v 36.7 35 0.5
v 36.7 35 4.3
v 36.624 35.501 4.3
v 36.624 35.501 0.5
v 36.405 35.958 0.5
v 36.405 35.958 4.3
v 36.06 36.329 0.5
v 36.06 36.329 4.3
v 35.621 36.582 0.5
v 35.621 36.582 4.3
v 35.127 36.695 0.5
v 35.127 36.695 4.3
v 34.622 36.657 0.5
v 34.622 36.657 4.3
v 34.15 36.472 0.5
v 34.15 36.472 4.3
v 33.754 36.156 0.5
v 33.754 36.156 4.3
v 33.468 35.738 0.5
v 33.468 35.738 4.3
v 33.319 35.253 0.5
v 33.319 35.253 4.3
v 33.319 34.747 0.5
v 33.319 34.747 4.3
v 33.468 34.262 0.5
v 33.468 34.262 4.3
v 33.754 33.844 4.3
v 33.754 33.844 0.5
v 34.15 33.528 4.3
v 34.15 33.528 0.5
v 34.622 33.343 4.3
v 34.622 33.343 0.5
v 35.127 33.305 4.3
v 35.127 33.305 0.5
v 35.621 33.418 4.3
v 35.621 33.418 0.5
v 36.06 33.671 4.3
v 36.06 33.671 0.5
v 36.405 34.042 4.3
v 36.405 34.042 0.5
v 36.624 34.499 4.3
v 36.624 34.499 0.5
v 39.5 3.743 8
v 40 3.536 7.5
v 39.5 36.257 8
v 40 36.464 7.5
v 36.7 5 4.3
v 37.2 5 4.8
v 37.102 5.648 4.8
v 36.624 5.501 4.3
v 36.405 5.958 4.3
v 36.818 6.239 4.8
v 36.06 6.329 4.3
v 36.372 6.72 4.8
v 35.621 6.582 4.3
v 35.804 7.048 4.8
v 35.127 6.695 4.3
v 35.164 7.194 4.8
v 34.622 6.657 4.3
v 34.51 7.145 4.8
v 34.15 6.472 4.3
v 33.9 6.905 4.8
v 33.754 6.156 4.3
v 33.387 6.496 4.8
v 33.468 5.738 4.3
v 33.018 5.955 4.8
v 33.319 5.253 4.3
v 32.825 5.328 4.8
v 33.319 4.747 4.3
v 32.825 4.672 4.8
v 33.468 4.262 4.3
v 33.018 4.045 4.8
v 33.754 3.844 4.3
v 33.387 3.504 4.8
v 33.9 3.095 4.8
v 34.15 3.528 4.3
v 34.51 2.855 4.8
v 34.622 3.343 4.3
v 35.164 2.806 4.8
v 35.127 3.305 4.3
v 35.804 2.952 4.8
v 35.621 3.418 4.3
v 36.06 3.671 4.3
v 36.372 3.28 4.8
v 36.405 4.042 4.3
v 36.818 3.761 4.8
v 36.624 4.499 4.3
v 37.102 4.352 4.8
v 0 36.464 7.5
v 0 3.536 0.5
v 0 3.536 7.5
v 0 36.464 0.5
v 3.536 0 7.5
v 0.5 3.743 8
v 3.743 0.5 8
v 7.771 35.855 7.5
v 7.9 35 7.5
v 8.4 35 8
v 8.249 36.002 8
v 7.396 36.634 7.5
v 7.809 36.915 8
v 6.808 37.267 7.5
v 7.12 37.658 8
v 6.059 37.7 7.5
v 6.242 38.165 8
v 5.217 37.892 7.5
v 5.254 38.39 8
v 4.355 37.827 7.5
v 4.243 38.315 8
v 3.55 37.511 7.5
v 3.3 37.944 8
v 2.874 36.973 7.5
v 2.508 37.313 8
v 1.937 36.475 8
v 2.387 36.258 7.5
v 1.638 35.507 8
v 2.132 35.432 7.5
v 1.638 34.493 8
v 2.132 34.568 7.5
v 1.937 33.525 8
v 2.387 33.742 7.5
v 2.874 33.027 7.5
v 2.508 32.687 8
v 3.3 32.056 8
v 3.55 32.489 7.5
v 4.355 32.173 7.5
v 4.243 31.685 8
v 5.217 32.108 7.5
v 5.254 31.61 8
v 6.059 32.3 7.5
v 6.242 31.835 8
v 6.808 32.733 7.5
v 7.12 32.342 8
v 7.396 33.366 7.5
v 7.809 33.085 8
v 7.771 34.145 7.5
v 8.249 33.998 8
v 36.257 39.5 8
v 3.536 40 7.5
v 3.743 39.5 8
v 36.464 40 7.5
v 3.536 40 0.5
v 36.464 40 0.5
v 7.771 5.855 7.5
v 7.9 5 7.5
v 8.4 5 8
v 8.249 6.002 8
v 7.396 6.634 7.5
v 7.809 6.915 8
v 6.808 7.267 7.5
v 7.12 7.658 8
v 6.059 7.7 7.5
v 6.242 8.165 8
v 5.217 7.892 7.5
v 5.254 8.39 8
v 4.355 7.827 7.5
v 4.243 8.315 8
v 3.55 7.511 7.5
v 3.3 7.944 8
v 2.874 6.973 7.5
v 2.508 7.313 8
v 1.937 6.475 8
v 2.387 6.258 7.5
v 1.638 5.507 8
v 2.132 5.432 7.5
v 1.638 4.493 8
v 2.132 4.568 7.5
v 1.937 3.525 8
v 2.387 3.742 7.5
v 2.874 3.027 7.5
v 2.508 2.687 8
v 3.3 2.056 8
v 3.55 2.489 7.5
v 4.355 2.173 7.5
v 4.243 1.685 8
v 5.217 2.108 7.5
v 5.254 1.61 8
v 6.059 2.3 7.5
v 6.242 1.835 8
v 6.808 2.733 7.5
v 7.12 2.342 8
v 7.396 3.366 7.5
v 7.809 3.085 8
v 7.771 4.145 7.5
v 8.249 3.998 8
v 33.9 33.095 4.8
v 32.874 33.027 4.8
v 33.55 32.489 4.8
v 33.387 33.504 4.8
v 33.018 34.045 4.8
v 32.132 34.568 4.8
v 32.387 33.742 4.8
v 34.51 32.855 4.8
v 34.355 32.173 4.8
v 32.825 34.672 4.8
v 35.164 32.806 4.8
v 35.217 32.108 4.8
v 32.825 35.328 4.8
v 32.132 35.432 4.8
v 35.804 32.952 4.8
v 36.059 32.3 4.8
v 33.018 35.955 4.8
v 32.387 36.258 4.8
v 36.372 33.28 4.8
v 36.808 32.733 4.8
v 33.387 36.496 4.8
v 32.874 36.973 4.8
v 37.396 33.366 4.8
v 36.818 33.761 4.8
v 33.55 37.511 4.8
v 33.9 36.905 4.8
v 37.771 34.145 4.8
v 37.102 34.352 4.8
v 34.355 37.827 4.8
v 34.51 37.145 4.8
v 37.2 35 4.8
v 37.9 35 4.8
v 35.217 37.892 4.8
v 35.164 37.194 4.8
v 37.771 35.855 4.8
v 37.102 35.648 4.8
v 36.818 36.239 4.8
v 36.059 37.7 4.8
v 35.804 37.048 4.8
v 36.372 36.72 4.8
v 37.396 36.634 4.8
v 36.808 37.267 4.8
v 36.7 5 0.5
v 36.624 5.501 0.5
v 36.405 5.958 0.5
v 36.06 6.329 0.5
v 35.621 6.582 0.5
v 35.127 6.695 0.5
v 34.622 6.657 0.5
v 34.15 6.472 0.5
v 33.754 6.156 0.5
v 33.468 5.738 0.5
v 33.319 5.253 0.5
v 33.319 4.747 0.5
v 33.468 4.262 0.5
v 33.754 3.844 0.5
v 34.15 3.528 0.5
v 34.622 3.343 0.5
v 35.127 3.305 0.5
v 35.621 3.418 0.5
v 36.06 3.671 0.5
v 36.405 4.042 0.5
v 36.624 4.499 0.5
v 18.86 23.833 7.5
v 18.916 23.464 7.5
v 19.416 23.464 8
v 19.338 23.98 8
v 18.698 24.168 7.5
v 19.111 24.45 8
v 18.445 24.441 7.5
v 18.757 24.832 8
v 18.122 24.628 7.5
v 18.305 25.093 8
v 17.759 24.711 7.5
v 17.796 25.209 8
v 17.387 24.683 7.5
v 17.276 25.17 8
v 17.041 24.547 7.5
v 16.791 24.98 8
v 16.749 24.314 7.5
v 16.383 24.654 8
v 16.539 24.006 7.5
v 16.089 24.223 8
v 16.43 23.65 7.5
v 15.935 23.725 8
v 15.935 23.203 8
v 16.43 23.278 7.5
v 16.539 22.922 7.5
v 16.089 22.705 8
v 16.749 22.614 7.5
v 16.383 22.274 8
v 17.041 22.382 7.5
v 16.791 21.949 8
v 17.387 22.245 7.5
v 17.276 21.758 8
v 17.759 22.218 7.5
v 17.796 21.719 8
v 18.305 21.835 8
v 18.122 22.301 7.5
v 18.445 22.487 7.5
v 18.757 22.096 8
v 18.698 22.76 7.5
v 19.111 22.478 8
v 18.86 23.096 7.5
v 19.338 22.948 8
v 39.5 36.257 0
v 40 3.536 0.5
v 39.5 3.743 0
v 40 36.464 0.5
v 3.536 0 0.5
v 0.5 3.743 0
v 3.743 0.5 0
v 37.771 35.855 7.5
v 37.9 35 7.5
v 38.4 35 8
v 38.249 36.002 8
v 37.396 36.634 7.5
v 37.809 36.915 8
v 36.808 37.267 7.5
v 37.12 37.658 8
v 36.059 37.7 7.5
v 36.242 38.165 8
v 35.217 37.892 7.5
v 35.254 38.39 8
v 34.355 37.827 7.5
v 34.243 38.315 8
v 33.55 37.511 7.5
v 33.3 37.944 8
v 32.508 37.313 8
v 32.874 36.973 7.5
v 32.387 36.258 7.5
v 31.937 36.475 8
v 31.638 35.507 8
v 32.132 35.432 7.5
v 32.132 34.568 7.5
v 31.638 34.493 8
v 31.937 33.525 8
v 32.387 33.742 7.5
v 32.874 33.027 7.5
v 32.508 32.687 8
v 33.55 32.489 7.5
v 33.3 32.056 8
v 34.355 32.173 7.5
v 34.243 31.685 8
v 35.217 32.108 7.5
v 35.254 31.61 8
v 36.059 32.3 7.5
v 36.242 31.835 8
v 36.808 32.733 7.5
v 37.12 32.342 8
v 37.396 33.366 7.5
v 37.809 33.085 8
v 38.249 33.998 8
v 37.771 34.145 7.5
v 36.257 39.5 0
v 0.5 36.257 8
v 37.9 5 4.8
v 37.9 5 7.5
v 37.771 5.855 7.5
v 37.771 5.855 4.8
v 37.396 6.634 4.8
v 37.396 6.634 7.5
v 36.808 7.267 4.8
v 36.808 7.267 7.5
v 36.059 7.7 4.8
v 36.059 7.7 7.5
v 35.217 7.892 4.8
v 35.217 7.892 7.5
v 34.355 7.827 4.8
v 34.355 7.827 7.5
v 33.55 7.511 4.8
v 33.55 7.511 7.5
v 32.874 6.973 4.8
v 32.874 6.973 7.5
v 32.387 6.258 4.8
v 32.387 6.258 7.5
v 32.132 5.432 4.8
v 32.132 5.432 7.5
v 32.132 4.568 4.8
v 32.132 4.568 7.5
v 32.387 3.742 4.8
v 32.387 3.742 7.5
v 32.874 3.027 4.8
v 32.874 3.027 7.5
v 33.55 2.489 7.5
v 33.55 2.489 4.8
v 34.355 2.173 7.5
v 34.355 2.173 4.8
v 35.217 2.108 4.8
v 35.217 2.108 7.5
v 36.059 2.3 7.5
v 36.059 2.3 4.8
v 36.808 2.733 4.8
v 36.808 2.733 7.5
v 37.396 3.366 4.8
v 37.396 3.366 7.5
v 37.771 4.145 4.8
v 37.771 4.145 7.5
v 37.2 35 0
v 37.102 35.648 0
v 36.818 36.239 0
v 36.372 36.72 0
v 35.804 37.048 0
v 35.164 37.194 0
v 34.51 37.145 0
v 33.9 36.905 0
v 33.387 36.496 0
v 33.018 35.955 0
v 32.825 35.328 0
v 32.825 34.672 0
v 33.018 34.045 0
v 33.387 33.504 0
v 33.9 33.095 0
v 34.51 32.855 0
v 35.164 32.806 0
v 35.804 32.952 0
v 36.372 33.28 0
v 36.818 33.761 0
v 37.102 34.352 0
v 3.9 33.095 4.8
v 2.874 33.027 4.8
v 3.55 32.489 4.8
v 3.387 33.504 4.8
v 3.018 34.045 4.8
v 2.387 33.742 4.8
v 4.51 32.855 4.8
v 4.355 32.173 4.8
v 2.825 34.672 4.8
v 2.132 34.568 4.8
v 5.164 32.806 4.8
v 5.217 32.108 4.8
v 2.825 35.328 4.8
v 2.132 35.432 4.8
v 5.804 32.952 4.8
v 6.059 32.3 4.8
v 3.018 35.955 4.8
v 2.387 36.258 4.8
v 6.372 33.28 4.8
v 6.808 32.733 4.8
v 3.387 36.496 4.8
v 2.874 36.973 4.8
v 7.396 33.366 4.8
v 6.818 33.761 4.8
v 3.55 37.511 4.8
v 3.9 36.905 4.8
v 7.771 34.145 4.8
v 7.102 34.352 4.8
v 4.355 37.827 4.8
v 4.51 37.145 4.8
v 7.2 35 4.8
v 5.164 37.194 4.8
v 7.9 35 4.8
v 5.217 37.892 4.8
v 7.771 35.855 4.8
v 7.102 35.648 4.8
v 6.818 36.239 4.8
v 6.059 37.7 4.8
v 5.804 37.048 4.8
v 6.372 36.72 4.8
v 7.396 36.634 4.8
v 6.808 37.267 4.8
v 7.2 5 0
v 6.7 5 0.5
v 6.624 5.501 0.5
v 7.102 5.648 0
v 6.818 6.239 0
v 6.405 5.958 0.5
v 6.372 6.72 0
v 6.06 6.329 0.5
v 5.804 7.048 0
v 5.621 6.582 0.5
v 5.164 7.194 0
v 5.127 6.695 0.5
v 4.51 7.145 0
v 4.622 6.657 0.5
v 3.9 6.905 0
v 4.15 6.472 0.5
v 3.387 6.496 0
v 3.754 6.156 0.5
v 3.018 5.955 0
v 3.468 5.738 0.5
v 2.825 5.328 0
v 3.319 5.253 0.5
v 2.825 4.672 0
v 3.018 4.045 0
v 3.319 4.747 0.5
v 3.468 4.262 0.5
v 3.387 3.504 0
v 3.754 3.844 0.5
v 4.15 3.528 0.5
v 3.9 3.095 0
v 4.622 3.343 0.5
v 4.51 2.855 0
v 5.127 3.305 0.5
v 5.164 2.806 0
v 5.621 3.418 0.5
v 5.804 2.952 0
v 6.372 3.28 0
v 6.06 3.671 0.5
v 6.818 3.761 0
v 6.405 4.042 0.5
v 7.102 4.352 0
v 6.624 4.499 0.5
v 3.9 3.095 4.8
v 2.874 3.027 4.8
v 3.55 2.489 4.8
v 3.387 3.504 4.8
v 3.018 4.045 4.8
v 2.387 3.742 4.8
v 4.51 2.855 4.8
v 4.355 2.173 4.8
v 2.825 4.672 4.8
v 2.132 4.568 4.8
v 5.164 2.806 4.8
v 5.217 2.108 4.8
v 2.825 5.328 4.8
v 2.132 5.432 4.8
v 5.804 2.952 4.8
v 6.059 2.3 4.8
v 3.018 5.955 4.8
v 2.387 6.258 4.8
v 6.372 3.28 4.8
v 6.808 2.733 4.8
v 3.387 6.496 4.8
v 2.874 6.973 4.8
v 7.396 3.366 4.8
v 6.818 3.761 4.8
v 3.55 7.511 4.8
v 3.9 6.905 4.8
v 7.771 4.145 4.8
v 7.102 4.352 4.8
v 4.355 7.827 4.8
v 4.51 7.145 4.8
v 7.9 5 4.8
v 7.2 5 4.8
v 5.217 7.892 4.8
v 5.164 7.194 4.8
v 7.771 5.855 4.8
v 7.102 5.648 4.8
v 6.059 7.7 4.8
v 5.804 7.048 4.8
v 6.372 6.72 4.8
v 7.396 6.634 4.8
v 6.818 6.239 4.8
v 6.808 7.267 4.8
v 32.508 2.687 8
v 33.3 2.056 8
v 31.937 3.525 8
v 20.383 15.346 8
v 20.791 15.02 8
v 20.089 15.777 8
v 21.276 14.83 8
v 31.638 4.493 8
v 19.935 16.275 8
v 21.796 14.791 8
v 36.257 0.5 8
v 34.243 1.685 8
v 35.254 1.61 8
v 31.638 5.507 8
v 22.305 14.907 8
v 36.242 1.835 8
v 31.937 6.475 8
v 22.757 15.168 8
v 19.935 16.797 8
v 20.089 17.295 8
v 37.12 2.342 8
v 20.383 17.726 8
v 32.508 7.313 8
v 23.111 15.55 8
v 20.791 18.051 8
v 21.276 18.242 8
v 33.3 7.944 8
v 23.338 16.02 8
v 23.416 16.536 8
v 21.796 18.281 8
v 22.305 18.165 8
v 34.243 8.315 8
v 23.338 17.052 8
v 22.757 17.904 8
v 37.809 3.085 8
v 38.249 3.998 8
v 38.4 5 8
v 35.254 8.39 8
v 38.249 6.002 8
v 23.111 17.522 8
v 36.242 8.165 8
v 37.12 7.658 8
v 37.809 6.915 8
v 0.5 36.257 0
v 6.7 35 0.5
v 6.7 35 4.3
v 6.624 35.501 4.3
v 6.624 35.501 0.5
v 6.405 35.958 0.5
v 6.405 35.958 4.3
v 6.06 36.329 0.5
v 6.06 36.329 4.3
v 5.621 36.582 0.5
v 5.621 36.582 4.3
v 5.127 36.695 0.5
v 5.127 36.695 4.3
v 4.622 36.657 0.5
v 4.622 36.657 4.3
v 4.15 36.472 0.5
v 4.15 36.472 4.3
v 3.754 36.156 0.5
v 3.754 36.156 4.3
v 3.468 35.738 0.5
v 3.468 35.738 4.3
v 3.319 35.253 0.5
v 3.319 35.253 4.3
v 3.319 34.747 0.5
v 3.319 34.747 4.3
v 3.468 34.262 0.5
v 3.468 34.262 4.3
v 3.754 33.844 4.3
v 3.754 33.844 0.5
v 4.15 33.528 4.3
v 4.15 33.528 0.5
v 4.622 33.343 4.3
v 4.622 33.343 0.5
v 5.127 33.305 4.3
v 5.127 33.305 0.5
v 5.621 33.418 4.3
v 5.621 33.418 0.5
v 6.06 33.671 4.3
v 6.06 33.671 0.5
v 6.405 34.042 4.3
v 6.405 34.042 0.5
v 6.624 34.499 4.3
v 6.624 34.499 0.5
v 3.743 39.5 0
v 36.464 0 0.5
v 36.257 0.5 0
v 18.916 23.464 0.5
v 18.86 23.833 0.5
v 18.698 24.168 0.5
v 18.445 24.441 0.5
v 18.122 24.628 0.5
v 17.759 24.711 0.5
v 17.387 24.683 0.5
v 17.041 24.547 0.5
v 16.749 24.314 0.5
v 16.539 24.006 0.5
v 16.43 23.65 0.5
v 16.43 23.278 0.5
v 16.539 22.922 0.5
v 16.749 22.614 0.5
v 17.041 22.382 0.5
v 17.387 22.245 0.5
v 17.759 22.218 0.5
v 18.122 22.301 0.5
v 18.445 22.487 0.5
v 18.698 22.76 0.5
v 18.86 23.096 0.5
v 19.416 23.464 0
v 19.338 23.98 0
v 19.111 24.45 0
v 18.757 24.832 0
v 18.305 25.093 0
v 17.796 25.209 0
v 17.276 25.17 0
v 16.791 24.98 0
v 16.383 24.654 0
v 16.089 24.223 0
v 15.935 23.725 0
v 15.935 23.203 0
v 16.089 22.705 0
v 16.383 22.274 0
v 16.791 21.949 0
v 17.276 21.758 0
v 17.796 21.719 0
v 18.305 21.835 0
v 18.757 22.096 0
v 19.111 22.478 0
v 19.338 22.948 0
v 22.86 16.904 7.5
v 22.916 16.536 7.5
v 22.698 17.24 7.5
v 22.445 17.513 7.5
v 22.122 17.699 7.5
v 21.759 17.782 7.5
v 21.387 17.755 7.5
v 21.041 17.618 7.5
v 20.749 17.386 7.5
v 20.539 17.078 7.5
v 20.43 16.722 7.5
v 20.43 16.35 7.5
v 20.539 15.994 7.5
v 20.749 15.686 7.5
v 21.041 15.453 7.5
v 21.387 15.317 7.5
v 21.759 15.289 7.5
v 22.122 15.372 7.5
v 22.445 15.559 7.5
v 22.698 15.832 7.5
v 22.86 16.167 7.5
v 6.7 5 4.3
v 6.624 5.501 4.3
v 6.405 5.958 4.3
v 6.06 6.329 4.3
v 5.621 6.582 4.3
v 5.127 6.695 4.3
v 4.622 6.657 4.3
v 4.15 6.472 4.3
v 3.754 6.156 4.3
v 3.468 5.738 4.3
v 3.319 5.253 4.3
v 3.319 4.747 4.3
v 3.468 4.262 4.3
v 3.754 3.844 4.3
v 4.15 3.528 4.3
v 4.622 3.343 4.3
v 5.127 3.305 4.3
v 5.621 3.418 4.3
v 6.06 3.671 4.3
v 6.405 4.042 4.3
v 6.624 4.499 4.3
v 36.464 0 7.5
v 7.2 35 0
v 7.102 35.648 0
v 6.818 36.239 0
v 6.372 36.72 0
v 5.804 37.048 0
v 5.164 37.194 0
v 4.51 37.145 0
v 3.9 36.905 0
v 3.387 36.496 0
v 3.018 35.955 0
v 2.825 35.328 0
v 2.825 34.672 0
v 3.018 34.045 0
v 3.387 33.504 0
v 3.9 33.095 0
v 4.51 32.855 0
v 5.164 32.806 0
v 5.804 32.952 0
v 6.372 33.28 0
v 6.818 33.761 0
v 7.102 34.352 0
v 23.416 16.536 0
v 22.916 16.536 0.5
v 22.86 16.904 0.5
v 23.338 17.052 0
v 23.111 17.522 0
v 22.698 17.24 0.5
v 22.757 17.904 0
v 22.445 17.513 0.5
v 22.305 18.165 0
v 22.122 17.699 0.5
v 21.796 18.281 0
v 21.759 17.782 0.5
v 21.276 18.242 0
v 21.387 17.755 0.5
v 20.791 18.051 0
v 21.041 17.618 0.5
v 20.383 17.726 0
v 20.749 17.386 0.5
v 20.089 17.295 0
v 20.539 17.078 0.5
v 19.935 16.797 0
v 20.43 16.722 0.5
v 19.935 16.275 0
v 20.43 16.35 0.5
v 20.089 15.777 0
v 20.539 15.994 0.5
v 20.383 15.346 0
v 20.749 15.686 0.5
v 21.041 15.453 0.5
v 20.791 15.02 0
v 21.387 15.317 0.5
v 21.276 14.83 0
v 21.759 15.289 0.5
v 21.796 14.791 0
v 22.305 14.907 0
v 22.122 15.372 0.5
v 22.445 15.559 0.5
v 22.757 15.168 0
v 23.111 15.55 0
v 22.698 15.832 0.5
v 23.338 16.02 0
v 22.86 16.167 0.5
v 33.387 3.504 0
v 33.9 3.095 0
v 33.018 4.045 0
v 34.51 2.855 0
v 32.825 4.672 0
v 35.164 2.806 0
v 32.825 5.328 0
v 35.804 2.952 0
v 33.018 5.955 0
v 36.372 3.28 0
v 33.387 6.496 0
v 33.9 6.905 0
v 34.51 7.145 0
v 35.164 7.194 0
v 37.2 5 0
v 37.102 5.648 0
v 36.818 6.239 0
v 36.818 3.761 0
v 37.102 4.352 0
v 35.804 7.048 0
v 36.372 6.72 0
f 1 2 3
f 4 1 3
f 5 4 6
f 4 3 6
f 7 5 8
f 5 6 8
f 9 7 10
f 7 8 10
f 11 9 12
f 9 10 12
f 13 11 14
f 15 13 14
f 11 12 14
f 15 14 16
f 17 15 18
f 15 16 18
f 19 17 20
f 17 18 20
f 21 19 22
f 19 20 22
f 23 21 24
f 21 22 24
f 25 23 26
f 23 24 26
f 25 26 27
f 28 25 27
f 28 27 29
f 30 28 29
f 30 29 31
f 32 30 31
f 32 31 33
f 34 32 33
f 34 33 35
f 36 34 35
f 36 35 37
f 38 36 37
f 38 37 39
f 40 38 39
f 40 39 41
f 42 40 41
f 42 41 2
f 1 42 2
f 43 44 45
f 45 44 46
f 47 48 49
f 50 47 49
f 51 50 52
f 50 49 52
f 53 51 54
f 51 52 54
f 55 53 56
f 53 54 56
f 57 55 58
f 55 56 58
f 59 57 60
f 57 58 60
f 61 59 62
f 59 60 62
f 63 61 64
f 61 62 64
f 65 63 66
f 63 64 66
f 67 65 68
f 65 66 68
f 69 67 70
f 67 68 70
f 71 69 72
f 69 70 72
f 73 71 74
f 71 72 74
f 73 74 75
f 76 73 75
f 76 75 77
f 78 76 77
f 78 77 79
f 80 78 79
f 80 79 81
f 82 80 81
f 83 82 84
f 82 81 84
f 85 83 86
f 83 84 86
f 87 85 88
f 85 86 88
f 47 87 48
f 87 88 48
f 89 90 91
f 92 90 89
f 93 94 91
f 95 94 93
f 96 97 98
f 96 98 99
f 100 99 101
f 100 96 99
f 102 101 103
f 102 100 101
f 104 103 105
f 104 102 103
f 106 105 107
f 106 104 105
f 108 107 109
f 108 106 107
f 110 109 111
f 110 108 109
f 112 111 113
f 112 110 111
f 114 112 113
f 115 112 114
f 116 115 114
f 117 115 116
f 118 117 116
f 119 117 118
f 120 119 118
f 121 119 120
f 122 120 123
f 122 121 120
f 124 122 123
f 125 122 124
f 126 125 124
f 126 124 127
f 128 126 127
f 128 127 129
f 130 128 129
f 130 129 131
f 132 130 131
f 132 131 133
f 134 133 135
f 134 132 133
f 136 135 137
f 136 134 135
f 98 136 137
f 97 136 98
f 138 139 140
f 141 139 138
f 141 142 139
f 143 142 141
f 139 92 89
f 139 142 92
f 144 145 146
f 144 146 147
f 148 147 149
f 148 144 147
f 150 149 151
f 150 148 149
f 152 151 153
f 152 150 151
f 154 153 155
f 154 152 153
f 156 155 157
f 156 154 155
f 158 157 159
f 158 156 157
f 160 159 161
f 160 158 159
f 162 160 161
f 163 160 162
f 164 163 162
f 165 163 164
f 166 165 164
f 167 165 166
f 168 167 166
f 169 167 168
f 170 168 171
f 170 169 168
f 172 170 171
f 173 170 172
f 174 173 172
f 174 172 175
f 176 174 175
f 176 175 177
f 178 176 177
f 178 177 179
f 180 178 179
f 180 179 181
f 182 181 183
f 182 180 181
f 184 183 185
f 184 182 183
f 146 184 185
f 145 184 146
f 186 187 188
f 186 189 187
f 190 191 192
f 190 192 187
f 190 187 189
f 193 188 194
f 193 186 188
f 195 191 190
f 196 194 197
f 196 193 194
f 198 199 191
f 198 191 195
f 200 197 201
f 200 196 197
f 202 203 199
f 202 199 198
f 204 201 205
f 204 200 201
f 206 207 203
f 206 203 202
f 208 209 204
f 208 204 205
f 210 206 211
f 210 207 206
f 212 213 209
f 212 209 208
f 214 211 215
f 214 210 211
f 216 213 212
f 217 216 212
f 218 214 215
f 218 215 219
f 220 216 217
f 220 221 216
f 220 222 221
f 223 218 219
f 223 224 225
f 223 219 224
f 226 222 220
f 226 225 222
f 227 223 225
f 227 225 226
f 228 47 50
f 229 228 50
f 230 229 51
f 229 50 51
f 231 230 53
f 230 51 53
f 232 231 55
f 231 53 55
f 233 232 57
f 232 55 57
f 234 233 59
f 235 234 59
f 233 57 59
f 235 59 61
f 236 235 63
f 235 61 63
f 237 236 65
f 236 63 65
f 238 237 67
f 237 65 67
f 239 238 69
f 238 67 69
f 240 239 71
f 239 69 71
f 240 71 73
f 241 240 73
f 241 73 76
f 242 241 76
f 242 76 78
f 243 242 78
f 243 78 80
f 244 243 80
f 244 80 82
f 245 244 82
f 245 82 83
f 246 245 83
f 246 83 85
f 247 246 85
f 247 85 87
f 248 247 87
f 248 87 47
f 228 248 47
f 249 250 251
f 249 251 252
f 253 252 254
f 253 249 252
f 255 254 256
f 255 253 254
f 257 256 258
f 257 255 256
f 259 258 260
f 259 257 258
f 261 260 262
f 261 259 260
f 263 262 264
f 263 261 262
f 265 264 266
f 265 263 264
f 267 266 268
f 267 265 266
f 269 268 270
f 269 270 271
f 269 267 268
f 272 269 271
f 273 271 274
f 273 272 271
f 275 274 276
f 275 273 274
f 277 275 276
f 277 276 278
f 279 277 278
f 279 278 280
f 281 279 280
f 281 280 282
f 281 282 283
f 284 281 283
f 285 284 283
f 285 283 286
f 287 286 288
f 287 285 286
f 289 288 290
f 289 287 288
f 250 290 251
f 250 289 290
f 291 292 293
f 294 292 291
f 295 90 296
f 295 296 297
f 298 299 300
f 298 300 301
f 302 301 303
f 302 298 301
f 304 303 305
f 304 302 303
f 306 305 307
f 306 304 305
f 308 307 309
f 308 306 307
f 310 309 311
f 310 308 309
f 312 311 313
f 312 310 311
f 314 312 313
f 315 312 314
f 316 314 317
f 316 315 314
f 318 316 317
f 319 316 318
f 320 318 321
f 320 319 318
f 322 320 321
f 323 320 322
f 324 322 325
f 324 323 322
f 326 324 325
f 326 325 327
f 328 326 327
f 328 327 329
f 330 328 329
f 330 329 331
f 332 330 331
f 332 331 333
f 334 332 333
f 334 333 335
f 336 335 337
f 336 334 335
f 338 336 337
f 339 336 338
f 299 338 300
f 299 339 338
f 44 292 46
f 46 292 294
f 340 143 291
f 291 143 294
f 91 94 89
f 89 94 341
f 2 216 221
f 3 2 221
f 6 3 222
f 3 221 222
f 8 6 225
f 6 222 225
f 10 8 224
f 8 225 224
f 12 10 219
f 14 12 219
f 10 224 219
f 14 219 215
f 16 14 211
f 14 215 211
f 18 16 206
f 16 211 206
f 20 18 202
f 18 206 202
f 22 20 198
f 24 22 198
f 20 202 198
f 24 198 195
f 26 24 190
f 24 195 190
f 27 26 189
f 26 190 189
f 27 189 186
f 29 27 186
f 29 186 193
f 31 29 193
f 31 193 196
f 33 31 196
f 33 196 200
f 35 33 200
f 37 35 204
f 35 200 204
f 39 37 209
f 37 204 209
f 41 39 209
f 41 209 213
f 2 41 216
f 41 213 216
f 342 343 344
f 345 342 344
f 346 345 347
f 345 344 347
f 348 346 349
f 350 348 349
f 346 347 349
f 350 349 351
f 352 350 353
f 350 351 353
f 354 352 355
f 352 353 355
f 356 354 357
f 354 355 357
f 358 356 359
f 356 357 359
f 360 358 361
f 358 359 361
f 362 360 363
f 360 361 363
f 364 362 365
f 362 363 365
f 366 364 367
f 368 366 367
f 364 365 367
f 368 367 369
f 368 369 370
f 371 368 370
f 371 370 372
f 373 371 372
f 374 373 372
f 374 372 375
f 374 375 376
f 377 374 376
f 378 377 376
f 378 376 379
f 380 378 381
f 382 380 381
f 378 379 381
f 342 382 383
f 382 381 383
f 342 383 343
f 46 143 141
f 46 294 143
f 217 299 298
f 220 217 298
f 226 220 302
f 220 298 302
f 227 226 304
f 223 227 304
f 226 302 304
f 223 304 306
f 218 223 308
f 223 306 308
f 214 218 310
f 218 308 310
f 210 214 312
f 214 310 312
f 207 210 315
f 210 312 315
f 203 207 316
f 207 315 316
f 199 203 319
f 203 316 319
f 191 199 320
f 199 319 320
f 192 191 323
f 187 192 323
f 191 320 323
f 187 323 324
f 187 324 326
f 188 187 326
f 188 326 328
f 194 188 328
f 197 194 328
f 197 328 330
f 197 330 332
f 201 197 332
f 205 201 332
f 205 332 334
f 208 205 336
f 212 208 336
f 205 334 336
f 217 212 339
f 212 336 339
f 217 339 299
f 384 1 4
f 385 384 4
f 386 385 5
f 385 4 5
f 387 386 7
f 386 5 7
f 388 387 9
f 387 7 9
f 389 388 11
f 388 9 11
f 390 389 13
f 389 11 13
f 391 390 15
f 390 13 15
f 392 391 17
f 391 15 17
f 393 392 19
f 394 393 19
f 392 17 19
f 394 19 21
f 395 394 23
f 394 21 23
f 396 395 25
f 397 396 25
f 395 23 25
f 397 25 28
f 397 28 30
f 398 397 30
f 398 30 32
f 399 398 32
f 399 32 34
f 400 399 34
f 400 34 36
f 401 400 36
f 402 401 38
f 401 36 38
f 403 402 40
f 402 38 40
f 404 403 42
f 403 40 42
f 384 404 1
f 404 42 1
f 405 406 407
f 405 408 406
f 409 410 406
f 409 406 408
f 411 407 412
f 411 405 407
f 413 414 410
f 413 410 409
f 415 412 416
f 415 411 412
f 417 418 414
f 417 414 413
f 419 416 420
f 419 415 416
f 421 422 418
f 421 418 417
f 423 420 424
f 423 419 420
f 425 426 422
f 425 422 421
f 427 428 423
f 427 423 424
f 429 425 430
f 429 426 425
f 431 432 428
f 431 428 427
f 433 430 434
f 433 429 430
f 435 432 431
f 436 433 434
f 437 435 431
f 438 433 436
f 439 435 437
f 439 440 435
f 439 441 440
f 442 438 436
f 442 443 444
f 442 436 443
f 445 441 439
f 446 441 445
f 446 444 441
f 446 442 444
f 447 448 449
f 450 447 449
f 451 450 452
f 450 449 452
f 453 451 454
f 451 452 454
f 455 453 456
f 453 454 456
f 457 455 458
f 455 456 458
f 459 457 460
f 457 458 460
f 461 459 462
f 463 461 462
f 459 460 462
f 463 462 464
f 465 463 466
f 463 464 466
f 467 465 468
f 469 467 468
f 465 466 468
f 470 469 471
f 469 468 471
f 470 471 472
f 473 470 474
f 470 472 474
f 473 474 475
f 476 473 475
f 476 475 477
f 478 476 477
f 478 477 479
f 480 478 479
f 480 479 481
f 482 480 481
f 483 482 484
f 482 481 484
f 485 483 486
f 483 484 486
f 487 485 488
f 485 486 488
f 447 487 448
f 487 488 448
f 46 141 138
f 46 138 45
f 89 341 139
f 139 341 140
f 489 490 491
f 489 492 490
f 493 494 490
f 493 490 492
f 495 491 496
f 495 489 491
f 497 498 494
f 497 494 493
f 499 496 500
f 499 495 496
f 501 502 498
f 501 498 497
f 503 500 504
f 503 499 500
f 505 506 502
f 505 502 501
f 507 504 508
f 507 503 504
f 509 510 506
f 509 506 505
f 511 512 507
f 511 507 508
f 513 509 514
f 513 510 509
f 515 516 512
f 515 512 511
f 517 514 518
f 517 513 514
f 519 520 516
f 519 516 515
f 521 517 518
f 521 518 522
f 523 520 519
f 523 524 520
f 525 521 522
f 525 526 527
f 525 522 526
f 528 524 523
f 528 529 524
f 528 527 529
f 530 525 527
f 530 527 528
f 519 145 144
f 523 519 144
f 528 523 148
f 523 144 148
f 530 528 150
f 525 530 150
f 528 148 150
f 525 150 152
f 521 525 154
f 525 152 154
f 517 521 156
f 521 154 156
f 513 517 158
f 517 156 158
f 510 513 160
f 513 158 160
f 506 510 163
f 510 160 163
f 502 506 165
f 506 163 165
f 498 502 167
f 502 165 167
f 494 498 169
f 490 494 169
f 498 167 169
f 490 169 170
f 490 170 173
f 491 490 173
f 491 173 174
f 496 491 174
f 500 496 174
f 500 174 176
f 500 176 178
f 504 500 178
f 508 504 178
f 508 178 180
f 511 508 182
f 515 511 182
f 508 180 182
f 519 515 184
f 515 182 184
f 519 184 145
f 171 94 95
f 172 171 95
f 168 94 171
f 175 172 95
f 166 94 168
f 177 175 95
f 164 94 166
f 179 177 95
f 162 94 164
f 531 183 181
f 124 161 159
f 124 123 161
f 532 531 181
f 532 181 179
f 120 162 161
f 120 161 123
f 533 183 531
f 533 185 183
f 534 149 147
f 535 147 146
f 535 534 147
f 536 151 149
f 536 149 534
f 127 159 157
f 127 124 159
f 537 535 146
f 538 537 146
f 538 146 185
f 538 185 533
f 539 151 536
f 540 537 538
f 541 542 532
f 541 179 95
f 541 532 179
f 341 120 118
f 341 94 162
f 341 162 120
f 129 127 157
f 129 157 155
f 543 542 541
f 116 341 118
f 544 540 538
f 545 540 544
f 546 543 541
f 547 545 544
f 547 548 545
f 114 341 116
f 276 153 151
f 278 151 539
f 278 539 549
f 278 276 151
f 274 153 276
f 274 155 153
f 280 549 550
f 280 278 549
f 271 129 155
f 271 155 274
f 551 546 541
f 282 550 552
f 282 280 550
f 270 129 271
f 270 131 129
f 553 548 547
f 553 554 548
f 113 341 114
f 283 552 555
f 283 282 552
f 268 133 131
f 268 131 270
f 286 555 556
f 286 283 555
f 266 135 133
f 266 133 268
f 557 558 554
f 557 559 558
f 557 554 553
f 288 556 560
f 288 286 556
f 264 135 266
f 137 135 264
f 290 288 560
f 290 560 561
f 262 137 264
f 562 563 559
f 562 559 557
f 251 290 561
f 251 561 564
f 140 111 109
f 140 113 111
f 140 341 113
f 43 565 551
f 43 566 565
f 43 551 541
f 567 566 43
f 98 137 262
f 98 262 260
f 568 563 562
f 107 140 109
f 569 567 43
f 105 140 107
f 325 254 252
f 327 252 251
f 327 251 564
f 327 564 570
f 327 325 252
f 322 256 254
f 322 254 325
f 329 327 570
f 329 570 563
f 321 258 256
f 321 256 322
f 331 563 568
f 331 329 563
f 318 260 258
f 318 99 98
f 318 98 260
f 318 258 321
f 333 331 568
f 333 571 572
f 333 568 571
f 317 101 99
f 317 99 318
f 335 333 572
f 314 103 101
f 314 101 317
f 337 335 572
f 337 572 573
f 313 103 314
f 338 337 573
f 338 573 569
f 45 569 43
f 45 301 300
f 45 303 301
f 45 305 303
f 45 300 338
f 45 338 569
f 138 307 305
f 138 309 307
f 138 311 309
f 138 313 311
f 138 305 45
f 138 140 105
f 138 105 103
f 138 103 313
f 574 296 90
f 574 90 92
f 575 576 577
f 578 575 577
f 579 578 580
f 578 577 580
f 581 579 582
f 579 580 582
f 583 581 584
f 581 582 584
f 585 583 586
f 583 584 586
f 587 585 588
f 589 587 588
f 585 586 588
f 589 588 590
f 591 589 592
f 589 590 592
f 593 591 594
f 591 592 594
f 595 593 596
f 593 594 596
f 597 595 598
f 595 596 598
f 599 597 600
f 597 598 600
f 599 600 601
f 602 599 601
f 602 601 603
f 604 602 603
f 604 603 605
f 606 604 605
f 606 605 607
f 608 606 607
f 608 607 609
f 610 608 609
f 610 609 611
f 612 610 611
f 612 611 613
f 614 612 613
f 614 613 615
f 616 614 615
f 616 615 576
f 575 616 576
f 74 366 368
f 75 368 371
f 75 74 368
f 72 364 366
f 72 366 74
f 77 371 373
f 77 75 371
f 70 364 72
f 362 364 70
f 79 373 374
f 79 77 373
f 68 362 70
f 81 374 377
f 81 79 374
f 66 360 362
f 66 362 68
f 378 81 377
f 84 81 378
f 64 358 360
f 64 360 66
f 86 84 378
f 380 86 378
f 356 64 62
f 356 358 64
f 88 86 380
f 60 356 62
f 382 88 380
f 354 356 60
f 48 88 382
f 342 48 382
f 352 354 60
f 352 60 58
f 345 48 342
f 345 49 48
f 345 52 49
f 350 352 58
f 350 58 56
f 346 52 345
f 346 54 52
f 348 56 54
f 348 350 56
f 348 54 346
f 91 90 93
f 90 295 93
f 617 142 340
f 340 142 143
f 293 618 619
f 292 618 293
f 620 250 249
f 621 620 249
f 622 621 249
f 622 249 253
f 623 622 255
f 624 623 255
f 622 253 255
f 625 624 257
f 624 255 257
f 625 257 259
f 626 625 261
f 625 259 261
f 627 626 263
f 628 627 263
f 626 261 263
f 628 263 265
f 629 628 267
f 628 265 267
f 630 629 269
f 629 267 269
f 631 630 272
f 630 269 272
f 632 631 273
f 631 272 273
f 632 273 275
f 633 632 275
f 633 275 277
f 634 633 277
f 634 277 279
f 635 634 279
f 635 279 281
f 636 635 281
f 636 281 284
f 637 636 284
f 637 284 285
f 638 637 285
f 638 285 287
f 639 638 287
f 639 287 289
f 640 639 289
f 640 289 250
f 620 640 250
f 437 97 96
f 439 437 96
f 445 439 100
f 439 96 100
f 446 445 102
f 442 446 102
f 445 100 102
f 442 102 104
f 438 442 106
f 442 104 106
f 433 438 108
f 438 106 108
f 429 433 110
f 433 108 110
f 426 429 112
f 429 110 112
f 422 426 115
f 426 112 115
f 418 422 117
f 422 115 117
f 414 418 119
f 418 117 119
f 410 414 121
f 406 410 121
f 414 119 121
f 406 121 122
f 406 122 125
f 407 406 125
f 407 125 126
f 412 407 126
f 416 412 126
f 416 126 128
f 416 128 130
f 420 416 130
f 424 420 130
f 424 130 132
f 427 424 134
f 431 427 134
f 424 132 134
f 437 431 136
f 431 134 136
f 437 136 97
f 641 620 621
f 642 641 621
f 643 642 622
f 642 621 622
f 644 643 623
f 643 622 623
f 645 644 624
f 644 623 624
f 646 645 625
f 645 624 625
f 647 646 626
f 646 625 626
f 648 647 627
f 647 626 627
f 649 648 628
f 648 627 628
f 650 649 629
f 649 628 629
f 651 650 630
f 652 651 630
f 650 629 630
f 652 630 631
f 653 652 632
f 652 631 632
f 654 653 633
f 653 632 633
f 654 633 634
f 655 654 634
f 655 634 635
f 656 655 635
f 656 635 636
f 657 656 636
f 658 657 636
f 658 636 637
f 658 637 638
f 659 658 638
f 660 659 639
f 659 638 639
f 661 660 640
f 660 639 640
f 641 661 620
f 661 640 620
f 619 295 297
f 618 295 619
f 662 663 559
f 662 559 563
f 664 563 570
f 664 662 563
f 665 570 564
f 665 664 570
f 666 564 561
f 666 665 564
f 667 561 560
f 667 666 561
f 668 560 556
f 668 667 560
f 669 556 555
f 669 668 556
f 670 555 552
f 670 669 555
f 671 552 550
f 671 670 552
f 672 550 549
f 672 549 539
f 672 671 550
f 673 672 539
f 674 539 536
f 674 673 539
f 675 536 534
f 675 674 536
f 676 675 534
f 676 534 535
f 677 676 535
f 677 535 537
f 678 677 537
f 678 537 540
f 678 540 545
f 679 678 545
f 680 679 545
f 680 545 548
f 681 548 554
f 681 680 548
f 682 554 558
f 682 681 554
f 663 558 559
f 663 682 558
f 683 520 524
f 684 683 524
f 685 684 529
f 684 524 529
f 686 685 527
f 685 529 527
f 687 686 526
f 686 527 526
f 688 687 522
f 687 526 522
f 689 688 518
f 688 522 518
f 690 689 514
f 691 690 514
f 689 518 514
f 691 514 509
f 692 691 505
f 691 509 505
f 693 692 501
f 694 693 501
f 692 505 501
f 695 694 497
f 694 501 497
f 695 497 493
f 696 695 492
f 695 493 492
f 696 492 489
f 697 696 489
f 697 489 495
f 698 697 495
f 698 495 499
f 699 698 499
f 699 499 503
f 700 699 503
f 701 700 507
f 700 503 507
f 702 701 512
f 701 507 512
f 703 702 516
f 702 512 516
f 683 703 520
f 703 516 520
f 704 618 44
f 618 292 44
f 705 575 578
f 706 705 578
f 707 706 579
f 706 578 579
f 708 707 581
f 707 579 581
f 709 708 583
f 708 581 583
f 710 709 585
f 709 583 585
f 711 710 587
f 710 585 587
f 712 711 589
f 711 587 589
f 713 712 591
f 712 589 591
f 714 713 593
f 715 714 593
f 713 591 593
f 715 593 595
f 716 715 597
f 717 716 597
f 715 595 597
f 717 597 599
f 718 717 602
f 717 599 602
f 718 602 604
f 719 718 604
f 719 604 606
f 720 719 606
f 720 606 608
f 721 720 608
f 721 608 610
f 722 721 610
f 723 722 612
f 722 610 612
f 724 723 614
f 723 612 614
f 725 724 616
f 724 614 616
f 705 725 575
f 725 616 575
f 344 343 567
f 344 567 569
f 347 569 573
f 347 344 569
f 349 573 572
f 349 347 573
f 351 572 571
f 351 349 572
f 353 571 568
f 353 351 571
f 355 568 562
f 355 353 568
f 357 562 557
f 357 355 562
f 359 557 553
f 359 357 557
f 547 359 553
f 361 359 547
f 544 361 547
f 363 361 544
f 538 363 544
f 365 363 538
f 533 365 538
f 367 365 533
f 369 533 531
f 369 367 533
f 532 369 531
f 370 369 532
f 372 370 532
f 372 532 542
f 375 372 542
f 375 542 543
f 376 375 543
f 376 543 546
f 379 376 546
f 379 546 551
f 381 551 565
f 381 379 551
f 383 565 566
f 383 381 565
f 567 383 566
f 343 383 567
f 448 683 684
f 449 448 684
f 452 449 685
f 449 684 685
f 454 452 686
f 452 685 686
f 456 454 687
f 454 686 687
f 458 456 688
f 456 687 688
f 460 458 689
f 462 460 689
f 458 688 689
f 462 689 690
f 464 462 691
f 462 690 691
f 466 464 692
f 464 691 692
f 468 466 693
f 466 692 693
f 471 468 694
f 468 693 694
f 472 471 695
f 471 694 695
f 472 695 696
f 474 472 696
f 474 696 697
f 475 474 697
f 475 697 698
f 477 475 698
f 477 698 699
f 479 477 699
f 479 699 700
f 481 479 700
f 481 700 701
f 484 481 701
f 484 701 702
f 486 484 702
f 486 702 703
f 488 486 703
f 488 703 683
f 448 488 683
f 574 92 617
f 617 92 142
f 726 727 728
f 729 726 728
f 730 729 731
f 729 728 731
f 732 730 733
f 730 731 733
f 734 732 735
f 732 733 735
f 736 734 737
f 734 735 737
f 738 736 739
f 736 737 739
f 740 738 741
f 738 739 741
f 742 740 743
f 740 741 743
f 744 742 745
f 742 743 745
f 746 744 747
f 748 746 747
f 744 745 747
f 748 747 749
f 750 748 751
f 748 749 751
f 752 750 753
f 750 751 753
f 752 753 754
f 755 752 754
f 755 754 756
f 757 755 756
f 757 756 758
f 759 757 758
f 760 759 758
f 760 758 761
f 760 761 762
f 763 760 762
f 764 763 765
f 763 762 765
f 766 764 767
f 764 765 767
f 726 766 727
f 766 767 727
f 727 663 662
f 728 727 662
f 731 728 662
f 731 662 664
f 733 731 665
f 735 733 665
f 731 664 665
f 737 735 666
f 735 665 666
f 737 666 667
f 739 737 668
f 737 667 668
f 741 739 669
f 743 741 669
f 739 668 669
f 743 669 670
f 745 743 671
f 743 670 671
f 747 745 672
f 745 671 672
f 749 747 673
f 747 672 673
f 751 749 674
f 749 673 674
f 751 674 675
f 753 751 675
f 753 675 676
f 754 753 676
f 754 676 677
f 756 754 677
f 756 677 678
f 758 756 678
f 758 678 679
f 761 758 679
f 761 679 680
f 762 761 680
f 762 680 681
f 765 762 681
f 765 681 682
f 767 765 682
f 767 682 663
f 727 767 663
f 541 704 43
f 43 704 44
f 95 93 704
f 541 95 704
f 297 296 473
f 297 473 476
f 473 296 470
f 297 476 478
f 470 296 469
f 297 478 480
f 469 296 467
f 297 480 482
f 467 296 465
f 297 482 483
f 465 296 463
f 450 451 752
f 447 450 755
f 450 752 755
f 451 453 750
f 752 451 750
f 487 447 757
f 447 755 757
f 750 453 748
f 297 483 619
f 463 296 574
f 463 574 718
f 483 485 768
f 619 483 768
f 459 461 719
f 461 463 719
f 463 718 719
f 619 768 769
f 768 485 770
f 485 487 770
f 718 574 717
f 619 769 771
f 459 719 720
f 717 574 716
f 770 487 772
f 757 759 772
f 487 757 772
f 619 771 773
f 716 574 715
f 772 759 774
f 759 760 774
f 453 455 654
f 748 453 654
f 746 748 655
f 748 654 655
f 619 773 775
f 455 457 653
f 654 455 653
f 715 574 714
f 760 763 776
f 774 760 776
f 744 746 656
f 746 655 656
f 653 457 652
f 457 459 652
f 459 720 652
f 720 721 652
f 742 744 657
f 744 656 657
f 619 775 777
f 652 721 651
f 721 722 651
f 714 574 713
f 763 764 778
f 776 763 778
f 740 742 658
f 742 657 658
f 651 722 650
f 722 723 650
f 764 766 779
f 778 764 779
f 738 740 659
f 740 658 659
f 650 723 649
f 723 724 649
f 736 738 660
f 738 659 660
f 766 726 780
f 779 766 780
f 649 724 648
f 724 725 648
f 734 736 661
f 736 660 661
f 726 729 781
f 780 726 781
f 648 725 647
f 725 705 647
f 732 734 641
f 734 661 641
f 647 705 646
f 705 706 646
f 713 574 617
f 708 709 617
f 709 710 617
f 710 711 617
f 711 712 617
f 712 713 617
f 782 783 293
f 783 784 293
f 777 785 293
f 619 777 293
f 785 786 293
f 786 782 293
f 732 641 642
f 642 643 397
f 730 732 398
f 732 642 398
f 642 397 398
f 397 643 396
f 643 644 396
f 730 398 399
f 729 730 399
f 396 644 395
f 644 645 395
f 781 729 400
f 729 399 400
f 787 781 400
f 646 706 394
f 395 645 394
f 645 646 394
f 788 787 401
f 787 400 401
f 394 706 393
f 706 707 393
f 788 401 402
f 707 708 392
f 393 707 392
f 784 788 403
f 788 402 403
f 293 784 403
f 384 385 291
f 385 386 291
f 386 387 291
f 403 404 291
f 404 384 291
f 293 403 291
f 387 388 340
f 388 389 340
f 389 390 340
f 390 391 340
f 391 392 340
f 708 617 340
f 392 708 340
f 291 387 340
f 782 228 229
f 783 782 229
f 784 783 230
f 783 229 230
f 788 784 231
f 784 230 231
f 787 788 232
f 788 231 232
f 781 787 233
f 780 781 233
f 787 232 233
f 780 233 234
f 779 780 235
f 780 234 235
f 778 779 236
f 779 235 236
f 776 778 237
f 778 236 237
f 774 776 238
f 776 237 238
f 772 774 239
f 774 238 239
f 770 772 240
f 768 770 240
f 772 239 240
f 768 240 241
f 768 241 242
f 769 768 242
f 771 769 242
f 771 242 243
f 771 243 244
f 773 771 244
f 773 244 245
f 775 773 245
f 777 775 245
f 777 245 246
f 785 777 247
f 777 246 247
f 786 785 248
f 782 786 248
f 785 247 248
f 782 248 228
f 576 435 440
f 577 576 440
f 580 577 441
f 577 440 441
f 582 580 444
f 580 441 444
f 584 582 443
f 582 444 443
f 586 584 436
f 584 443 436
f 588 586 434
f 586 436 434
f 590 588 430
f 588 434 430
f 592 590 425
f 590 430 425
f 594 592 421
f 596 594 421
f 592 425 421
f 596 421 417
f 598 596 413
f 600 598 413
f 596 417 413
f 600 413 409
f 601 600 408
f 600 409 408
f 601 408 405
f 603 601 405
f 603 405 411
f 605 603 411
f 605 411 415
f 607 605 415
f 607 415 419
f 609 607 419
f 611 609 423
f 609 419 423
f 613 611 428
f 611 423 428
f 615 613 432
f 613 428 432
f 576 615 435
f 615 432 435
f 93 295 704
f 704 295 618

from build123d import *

# Parameters (mm, degrees)
SKETCH1_W           = 40
SKETCH1_H           = 40
BOSS_EXTRUDE1_DEPTH = 8
SKETCH2_R           = 1.7
CUT_EXTRUDE1_DEPTH  = 58.131427428
SKETCH3_R           = 1.25
CUT_EXTRUDE2_DEPTH  = 58.131427428
SKETCH4_R           = 2.9
CUT_EXTRUDE3_DEPTH  = 3.2
CHAMFER1_SIZE       = 3.536
CHAMFER2_SIZE       = 0.5


with BuildPart() as part:
    # Sketch1 → Boss-Extrude1 (new body)
    with BuildSketch(Plane.XY):
        with Locations((20, 20)):
            Rectangle(SKETCH1_W, SKETCH1_H)
    extrude(amount=BOSS_EXTRUDE1_DEPTH)

    # Sketch2 → Cut-Extrude1 (cut, through all)
    with BuildSketch(Plane.XY.offset(8)):
        with Locations((5, 35)):
            Circle(SKETCH2_R)
        with Locations((35, 35)):
            Circle(SKETCH2_R)
        with Locations((5, 5)):
            Circle(SKETCH2_R)
        with Locations((35, 5)):
            Circle(SKETCH2_R)
    extrude(amount=-CUT_EXTRUDE1_DEPTH, mode=Mode.SUBTRACT)

    # Sketch3 → Cut-Extrude2 (cut, through all)
    with BuildSketch(Plane.XY.offset(8)):
        with Locations((17.66557685, 23.464101615)):
            Circle(SKETCH3_R)
        with Locations((21.66557685, 16.535898385)):
            Circle(SKETCH3_R)
    extrude(amount=-CUT_EXTRUDE2_DEPTH, mode=Mode.SUBTRACT)

    # Sketch4 → Cut-Extrude3 (cut)
    with BuildSketch(Plane.XY.offset(8)):
        with Locations((5, 35)):
            Circle(SKETCH4_R)
        with Locations((35, 35)):
            Circle(SKETCH4_R)
        with Locations((5, 5)):
            Circle(SKETCH4_R)
        with Locations((35, 5)):
            Circle(SKETCH4_R)
    extrude(amount=-CUT_EXTRUDE3_DEPTH, mode=Mode.SUBTRACT)

    # Chamfer1
    chamfer1_edges = [part.edges().sort_by_distance(p)[0] for p in [
        (0, 40, 4),
        (40, 40, 4),
        (40, 0, 4),
        (0, 0, 4),
    ]]
    chamfer(chamfer1_edges, length=CHAMFER1_SIZE)

    # Chamfer2
    chamfer2_edges = [part.edges().sort_by_distance(p)[0] for p in [
        (33.3, 35, 0),
        (3.3, 5, 0),
        (33.3, 5, 0),
        (3.3, 35, 0),
        (16.41557685, 23.464101615, 0),
        (16.41557685, 23.464101615, 8),
        (20.41557685, 16.535898385, 0),
        (20.41557685, 16.535898385, 8),
        (32.1, 35, 8),
        (33.3, 35, 4.8),
        (2.1, 5, 8),
        (3.3, 5, 4.8),
        (32.1, 5, 8),
        (33.3, 5, 4.8),
        (2.1, 35, 8),
        (3.3, 35, 4.8),
        (0, 20, 0),
        (0, 20, 8),
        (20, 40, 0),
        (40, 20, 0),
        (20, 0, 0),
        (1.768, 1.768, 0),
        (38.232, 1.768, 0),
        (38.232, 38.232, 0),
        (1.768, 38.232, 0),
        (20, 40, 8),
        (20, 0, 8),
        (40, 20, 8),
        (1.768, 1.768, 8),
        (38.232, 1.768, 8),
        (38.232, 38.232, 8),
        (1.768, 38.232, 8),
    ]]
    chamfer(chamfer2_edges, length=CHAMFER2_SIZE)


solid = part.part
